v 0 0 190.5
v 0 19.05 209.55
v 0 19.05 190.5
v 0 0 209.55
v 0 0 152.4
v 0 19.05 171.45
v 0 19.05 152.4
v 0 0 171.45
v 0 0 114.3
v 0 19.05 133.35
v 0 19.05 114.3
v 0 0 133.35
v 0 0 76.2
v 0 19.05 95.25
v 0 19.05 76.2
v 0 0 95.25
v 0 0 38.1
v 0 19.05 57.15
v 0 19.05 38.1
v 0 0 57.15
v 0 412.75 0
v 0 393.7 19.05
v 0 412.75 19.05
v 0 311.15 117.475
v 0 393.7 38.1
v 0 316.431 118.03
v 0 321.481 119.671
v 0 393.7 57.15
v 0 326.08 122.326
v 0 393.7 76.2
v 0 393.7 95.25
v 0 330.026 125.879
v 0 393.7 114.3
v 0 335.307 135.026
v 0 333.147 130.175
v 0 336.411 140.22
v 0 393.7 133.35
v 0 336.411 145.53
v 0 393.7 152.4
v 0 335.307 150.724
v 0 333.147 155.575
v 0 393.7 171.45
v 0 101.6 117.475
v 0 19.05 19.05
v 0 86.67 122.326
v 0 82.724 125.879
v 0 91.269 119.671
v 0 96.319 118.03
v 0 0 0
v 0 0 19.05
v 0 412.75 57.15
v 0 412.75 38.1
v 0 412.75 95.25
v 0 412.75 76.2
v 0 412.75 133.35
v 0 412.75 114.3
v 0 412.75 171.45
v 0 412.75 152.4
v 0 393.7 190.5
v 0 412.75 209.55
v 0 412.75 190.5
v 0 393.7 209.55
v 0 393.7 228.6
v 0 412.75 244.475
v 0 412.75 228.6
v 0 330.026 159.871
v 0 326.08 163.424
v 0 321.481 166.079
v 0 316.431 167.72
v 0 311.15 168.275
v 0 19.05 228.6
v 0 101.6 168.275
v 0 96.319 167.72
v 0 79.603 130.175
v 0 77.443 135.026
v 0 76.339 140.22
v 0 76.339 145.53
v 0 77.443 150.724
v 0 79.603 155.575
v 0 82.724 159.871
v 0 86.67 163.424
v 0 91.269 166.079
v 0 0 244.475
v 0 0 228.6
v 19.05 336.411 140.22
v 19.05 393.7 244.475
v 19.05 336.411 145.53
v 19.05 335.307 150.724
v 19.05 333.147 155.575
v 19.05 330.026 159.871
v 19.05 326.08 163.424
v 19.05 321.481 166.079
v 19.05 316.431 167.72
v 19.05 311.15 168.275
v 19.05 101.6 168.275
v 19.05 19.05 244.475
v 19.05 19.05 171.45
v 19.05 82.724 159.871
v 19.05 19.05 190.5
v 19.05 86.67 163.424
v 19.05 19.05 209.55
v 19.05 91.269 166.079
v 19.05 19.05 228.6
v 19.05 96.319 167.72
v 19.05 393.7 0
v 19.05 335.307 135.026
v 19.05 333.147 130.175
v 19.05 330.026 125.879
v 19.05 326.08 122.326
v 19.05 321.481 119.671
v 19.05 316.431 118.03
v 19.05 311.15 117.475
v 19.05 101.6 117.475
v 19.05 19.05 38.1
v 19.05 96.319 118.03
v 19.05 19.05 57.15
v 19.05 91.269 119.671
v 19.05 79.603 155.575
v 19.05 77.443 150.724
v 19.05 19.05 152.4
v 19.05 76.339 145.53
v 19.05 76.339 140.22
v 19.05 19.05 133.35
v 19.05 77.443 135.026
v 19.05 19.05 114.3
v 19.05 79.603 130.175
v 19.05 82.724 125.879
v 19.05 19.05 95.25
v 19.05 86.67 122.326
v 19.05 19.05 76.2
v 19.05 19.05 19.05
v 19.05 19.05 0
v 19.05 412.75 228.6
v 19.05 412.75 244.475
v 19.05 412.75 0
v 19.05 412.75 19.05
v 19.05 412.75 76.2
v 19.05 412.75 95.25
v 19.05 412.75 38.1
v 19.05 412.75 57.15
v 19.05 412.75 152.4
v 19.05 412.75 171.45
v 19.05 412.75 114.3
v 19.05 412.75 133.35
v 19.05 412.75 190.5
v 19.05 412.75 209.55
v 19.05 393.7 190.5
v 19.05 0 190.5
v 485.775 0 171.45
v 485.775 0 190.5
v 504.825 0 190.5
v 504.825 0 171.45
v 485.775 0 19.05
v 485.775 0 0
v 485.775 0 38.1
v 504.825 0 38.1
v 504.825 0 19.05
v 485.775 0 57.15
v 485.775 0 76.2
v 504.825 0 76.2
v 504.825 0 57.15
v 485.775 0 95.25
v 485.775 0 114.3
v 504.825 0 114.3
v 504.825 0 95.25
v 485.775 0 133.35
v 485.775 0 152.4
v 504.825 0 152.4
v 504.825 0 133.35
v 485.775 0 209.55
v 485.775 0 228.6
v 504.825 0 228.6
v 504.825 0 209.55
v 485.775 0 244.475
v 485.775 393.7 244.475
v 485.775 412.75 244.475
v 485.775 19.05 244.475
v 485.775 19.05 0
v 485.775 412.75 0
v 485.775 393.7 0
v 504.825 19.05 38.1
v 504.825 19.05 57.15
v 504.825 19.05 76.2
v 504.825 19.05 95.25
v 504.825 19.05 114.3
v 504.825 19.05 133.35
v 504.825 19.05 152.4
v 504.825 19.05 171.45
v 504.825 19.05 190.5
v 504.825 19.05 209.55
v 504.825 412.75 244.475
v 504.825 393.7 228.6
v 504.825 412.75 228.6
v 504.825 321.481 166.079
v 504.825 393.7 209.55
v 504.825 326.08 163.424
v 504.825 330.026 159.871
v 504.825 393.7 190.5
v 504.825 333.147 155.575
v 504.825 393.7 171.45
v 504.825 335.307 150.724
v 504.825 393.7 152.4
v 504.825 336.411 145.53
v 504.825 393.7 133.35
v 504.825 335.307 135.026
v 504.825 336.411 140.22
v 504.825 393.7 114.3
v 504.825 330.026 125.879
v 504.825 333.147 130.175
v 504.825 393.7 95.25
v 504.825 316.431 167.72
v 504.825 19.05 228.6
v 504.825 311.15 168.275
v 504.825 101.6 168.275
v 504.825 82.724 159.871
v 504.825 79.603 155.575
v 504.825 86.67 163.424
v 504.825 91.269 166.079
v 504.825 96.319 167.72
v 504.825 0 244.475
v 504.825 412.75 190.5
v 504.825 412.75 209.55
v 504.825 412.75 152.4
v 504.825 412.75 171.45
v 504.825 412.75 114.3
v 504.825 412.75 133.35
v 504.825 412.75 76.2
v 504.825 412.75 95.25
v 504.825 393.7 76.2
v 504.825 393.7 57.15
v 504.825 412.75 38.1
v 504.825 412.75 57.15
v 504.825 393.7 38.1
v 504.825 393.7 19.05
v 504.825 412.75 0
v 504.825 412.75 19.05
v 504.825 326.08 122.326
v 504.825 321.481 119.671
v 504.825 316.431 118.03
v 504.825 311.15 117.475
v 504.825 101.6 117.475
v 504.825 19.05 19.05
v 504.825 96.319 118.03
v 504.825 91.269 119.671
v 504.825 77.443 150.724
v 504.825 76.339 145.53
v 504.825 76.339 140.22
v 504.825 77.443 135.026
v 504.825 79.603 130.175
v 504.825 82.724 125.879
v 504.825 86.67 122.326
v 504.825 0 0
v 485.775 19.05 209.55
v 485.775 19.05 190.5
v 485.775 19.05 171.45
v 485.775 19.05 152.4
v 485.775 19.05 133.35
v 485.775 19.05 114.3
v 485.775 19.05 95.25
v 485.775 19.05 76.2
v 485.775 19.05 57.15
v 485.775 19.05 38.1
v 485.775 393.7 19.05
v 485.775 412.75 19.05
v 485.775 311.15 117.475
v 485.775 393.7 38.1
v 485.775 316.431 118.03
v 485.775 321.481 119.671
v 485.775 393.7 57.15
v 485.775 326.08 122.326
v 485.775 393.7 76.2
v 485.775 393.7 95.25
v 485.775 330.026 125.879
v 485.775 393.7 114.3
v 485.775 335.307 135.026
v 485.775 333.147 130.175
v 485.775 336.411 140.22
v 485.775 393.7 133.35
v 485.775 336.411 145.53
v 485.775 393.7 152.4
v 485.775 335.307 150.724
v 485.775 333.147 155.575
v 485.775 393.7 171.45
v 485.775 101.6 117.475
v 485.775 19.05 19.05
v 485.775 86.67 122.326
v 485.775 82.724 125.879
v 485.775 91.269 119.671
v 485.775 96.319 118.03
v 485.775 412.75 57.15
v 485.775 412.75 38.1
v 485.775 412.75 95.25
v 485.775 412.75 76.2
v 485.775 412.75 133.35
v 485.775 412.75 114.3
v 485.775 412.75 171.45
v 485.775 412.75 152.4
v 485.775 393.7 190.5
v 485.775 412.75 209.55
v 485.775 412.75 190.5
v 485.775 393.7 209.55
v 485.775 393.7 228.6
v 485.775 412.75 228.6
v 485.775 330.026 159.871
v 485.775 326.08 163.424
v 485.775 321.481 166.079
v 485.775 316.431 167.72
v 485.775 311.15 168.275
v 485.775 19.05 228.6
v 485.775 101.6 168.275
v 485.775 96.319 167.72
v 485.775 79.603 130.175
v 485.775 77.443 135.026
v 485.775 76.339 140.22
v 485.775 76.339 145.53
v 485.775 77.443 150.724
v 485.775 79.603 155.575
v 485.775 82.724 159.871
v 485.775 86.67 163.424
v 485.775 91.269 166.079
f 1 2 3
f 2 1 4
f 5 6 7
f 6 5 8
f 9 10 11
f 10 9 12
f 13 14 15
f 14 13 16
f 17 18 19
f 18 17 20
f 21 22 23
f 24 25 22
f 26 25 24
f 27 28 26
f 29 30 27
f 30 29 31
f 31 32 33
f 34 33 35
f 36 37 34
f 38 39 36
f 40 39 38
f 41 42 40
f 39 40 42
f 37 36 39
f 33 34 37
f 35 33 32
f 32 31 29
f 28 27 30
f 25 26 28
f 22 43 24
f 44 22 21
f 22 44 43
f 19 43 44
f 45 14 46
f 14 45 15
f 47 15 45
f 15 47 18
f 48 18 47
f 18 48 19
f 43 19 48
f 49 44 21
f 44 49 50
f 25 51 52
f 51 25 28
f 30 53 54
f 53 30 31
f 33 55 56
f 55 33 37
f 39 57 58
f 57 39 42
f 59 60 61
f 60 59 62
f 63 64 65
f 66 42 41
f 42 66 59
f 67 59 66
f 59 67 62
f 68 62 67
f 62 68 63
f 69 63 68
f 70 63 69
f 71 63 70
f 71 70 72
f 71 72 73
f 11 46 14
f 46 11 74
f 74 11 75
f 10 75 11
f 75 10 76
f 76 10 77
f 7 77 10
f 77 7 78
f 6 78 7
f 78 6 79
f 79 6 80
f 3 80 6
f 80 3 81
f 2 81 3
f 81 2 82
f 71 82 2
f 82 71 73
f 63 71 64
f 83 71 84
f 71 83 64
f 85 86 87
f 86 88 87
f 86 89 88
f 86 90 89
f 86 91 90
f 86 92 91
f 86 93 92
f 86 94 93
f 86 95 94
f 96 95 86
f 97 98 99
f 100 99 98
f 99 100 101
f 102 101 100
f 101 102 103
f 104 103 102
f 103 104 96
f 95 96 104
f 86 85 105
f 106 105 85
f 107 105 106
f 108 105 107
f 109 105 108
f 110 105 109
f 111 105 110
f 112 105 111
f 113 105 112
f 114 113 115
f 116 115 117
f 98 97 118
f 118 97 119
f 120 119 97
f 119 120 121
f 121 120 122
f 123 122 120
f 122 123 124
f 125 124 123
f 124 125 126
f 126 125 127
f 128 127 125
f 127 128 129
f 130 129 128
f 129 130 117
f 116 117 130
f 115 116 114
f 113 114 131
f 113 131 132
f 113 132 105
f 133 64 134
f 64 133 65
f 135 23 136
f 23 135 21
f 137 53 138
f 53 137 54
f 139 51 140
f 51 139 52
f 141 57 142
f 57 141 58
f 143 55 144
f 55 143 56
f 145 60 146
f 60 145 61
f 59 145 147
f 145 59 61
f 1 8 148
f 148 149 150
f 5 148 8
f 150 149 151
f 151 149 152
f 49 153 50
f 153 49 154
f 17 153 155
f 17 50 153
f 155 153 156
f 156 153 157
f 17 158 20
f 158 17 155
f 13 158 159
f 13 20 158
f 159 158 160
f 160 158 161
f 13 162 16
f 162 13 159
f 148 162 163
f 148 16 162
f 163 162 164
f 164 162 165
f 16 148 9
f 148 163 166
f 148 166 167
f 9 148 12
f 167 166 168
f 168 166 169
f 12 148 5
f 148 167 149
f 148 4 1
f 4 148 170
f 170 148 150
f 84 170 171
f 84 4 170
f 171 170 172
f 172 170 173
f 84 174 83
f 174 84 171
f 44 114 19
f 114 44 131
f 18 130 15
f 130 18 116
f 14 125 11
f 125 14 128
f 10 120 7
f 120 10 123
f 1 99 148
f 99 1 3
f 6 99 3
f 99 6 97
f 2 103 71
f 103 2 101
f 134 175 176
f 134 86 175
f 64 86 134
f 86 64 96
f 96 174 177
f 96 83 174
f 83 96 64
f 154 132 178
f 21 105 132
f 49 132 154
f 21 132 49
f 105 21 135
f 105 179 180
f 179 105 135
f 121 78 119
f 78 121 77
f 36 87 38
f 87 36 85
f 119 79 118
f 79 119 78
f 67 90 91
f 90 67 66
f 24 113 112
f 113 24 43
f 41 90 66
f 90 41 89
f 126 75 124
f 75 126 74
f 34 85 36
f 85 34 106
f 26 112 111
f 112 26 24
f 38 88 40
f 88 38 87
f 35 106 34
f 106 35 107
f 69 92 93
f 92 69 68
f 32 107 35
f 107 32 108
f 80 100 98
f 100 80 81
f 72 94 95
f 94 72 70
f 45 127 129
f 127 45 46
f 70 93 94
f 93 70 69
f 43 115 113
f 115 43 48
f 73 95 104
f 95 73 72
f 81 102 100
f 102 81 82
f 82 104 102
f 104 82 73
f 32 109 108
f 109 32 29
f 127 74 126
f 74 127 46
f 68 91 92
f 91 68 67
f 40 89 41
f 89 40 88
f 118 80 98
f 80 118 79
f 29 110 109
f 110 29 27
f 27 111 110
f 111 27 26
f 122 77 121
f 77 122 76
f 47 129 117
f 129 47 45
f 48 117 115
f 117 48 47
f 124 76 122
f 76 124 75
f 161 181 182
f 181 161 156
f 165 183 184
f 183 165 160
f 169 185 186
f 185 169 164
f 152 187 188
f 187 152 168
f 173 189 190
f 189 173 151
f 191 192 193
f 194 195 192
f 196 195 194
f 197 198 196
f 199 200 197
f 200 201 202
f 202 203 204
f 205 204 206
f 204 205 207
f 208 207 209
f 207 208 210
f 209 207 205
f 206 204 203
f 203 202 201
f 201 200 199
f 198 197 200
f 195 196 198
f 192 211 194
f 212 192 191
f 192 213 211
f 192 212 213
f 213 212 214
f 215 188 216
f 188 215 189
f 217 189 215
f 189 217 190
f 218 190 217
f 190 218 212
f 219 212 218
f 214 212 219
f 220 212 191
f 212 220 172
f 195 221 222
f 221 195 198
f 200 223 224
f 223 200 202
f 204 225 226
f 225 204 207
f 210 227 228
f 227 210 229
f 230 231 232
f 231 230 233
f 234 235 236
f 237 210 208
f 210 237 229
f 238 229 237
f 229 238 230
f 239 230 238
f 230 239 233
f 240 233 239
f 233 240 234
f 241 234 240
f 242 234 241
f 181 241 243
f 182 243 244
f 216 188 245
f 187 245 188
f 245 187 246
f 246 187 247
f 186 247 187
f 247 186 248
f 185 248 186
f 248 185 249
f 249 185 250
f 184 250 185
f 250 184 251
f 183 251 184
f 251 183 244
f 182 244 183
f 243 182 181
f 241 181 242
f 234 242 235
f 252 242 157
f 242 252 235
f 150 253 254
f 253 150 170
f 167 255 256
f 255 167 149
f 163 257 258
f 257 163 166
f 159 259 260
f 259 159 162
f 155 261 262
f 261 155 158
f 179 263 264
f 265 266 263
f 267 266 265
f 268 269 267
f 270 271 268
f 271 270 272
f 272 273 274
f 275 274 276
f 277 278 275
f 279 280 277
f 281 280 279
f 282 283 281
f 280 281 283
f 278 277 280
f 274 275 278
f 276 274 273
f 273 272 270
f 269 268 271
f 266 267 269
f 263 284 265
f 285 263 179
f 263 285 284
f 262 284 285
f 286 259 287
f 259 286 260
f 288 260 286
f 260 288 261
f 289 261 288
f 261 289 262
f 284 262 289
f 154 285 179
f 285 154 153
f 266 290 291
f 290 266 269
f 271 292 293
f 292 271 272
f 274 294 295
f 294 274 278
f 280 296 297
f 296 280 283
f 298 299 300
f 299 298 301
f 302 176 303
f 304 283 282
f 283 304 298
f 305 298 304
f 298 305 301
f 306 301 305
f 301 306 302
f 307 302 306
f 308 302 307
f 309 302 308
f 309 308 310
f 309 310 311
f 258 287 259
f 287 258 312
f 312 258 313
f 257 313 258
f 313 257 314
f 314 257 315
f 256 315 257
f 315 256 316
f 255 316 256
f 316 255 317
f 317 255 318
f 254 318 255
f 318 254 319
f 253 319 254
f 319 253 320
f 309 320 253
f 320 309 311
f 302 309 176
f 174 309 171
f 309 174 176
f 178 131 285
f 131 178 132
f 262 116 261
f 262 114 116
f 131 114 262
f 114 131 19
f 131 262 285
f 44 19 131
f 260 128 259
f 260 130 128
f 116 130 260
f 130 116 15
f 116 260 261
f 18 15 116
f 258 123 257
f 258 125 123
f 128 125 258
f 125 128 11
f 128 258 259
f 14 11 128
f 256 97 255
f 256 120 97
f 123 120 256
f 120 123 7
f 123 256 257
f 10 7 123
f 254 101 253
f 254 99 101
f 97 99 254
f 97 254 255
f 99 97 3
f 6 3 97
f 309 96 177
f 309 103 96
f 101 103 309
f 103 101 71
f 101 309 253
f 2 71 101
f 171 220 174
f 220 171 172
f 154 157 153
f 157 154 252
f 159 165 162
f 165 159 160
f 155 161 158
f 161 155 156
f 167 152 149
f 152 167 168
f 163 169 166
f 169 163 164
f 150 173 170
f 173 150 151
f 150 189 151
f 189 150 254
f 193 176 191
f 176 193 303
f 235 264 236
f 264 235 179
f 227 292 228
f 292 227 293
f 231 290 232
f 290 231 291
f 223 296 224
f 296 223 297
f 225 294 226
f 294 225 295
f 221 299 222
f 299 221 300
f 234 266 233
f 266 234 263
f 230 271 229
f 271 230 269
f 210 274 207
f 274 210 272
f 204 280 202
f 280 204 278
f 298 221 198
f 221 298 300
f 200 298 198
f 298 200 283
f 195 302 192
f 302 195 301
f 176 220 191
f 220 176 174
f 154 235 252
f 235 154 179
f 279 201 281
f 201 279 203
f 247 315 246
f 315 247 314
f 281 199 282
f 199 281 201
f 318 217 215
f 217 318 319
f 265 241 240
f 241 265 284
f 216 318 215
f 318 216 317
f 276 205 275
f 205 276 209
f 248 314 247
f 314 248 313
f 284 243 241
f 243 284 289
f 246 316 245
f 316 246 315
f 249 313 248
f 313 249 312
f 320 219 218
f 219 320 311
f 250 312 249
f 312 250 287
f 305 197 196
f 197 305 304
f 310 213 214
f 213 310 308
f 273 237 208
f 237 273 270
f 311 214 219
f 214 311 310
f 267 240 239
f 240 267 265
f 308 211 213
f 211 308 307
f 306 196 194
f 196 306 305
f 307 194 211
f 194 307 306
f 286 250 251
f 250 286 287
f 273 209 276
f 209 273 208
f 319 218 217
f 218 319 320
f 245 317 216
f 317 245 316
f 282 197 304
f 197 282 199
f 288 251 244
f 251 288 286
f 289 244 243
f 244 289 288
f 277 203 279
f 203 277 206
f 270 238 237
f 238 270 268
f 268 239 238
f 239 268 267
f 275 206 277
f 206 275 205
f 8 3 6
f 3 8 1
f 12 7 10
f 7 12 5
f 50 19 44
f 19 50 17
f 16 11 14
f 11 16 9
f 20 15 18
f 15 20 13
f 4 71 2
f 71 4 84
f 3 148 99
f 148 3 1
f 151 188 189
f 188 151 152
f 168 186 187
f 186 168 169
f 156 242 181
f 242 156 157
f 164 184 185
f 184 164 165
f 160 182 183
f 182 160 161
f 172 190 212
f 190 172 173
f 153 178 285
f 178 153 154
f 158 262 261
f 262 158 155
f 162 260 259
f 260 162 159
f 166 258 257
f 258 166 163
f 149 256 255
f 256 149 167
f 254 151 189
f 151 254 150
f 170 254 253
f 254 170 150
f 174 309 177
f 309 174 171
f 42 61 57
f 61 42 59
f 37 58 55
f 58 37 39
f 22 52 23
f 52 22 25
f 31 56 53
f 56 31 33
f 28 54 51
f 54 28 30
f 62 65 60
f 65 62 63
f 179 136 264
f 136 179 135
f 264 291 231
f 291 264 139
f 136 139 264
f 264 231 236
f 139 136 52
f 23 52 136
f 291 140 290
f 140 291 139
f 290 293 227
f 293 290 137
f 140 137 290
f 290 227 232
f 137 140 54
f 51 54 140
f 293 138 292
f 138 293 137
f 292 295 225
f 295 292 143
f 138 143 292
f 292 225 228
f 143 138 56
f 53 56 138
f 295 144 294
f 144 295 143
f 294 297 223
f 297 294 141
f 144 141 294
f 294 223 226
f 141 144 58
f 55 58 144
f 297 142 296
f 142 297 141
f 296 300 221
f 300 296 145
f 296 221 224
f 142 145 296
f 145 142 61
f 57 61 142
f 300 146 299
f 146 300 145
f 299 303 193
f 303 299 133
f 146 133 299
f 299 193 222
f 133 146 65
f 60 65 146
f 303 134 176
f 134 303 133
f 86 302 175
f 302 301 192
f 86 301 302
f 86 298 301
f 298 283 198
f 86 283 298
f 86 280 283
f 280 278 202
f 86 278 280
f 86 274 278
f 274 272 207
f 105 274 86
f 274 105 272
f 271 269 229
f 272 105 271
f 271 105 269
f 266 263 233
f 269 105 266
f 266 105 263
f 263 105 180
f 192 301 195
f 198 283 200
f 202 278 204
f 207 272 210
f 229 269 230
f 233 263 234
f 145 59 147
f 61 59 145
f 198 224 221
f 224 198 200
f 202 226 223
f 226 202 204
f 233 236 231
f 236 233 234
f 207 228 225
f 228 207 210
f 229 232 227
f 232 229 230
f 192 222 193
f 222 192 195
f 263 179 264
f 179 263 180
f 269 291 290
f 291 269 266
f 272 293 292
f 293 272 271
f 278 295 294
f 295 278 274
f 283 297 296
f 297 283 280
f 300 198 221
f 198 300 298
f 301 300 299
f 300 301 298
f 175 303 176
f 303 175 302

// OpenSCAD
/**
    This is a cnc-able langstroth hive (currently only the Deep Hive Body)
    To use this, scroll to the bottom and then uncomment the projection lines individually, and then use openSCAD to generate dxfs.
    
    The handle holes are intended to be pockets cut into the boards.
    
    Copyright (C) 2018 Phillip Showers
    This model is released under the Creative Commons Attribution/Share Alike license.
    Attribute me if you use it. 
    Share it like I shared it.
    https://creativecommons.org/licenses/by-sa/4.0/

    Feel free to make money on it! If you want, donate some to www.fsf.org.
    
**/

in2mm=25.4;

beehiveDimensions = [(19+7/8)*in2mm, 16.25*in2mm, (9+5/8)*in2mm];
woodWidth = .75*in2mm;

module handleSide(){
    difference()
    {
        cube([woodWidth, beehiveDimensions.y, beehiveDimensions.z]);
        //slots
        for (zOffset =[woodWidth:woodWidth*2:beehiveDimensions.z])
            translate([0,0,zOffset])
                cube([woodWidth,woodWidth,woodWidth]);
        //slots
        for (zOffset =[woodWidth:woodWidth*2:beehiveDimensions.z])
            translate([0,beehiveDimensions.y-woodWidth,zOffset])
                cube([woodWidth,woodWidth,woodWidth]);
        //handle holes
        hull(){
        translate([0,4*in2mm,beehiveDimensions.z-4*in2mm])
            rotate([0,90,0])    
                cylinder(r1=in2mm,r2=in2mm, h=woodWidth);
        translate([0,beehiveDimensions.y-4*in2mm,beehiveDimensions.z-4*in2mm])
            rotate([0,90,0])    
                cylinder(r1=in2mm,r2=in2mm, h=woodWidth);
        }
    }    
}

module hiveFront(){
    difference()
    {
        cube([beehiveDimensions.x, woodWidth, beehiveDimensions.z]);
        for (zOffset =[0:woodWidth*2:beehiveDimensions.z])
            translate([0,0,zOffset])
                cube([woodWidth,woodWidth,woodWidth]);
        for (zOffset =[0:woodWidth*2:beehiveDimensions.z])
            translate([beehiveDimensions.x-woodWidth,0,zOffset])
                cube([woodWidth,woodWidth,woodWidth]);
    }
}

module beehive(){
    translate([woodWidth,beehiveDimensions.y,0])
        rotate([0,0,180])
            handleSide();
    translate([beehiveDimensions.x-woodWidth,0,0])
        handleSide();
    hiveFront();
    translate([0,beehiveDimensions.y-woodWidth,0])
        hiveFront();
}




beehive();
//projection(cut=false)translate([beehiveDimensions.z,0,0])rotate([0,-90,0])handleSide();
//projection(cut=false)translate([beehiveDimensions.z,0,0])rotate([-90,0,90])hiveFront();
